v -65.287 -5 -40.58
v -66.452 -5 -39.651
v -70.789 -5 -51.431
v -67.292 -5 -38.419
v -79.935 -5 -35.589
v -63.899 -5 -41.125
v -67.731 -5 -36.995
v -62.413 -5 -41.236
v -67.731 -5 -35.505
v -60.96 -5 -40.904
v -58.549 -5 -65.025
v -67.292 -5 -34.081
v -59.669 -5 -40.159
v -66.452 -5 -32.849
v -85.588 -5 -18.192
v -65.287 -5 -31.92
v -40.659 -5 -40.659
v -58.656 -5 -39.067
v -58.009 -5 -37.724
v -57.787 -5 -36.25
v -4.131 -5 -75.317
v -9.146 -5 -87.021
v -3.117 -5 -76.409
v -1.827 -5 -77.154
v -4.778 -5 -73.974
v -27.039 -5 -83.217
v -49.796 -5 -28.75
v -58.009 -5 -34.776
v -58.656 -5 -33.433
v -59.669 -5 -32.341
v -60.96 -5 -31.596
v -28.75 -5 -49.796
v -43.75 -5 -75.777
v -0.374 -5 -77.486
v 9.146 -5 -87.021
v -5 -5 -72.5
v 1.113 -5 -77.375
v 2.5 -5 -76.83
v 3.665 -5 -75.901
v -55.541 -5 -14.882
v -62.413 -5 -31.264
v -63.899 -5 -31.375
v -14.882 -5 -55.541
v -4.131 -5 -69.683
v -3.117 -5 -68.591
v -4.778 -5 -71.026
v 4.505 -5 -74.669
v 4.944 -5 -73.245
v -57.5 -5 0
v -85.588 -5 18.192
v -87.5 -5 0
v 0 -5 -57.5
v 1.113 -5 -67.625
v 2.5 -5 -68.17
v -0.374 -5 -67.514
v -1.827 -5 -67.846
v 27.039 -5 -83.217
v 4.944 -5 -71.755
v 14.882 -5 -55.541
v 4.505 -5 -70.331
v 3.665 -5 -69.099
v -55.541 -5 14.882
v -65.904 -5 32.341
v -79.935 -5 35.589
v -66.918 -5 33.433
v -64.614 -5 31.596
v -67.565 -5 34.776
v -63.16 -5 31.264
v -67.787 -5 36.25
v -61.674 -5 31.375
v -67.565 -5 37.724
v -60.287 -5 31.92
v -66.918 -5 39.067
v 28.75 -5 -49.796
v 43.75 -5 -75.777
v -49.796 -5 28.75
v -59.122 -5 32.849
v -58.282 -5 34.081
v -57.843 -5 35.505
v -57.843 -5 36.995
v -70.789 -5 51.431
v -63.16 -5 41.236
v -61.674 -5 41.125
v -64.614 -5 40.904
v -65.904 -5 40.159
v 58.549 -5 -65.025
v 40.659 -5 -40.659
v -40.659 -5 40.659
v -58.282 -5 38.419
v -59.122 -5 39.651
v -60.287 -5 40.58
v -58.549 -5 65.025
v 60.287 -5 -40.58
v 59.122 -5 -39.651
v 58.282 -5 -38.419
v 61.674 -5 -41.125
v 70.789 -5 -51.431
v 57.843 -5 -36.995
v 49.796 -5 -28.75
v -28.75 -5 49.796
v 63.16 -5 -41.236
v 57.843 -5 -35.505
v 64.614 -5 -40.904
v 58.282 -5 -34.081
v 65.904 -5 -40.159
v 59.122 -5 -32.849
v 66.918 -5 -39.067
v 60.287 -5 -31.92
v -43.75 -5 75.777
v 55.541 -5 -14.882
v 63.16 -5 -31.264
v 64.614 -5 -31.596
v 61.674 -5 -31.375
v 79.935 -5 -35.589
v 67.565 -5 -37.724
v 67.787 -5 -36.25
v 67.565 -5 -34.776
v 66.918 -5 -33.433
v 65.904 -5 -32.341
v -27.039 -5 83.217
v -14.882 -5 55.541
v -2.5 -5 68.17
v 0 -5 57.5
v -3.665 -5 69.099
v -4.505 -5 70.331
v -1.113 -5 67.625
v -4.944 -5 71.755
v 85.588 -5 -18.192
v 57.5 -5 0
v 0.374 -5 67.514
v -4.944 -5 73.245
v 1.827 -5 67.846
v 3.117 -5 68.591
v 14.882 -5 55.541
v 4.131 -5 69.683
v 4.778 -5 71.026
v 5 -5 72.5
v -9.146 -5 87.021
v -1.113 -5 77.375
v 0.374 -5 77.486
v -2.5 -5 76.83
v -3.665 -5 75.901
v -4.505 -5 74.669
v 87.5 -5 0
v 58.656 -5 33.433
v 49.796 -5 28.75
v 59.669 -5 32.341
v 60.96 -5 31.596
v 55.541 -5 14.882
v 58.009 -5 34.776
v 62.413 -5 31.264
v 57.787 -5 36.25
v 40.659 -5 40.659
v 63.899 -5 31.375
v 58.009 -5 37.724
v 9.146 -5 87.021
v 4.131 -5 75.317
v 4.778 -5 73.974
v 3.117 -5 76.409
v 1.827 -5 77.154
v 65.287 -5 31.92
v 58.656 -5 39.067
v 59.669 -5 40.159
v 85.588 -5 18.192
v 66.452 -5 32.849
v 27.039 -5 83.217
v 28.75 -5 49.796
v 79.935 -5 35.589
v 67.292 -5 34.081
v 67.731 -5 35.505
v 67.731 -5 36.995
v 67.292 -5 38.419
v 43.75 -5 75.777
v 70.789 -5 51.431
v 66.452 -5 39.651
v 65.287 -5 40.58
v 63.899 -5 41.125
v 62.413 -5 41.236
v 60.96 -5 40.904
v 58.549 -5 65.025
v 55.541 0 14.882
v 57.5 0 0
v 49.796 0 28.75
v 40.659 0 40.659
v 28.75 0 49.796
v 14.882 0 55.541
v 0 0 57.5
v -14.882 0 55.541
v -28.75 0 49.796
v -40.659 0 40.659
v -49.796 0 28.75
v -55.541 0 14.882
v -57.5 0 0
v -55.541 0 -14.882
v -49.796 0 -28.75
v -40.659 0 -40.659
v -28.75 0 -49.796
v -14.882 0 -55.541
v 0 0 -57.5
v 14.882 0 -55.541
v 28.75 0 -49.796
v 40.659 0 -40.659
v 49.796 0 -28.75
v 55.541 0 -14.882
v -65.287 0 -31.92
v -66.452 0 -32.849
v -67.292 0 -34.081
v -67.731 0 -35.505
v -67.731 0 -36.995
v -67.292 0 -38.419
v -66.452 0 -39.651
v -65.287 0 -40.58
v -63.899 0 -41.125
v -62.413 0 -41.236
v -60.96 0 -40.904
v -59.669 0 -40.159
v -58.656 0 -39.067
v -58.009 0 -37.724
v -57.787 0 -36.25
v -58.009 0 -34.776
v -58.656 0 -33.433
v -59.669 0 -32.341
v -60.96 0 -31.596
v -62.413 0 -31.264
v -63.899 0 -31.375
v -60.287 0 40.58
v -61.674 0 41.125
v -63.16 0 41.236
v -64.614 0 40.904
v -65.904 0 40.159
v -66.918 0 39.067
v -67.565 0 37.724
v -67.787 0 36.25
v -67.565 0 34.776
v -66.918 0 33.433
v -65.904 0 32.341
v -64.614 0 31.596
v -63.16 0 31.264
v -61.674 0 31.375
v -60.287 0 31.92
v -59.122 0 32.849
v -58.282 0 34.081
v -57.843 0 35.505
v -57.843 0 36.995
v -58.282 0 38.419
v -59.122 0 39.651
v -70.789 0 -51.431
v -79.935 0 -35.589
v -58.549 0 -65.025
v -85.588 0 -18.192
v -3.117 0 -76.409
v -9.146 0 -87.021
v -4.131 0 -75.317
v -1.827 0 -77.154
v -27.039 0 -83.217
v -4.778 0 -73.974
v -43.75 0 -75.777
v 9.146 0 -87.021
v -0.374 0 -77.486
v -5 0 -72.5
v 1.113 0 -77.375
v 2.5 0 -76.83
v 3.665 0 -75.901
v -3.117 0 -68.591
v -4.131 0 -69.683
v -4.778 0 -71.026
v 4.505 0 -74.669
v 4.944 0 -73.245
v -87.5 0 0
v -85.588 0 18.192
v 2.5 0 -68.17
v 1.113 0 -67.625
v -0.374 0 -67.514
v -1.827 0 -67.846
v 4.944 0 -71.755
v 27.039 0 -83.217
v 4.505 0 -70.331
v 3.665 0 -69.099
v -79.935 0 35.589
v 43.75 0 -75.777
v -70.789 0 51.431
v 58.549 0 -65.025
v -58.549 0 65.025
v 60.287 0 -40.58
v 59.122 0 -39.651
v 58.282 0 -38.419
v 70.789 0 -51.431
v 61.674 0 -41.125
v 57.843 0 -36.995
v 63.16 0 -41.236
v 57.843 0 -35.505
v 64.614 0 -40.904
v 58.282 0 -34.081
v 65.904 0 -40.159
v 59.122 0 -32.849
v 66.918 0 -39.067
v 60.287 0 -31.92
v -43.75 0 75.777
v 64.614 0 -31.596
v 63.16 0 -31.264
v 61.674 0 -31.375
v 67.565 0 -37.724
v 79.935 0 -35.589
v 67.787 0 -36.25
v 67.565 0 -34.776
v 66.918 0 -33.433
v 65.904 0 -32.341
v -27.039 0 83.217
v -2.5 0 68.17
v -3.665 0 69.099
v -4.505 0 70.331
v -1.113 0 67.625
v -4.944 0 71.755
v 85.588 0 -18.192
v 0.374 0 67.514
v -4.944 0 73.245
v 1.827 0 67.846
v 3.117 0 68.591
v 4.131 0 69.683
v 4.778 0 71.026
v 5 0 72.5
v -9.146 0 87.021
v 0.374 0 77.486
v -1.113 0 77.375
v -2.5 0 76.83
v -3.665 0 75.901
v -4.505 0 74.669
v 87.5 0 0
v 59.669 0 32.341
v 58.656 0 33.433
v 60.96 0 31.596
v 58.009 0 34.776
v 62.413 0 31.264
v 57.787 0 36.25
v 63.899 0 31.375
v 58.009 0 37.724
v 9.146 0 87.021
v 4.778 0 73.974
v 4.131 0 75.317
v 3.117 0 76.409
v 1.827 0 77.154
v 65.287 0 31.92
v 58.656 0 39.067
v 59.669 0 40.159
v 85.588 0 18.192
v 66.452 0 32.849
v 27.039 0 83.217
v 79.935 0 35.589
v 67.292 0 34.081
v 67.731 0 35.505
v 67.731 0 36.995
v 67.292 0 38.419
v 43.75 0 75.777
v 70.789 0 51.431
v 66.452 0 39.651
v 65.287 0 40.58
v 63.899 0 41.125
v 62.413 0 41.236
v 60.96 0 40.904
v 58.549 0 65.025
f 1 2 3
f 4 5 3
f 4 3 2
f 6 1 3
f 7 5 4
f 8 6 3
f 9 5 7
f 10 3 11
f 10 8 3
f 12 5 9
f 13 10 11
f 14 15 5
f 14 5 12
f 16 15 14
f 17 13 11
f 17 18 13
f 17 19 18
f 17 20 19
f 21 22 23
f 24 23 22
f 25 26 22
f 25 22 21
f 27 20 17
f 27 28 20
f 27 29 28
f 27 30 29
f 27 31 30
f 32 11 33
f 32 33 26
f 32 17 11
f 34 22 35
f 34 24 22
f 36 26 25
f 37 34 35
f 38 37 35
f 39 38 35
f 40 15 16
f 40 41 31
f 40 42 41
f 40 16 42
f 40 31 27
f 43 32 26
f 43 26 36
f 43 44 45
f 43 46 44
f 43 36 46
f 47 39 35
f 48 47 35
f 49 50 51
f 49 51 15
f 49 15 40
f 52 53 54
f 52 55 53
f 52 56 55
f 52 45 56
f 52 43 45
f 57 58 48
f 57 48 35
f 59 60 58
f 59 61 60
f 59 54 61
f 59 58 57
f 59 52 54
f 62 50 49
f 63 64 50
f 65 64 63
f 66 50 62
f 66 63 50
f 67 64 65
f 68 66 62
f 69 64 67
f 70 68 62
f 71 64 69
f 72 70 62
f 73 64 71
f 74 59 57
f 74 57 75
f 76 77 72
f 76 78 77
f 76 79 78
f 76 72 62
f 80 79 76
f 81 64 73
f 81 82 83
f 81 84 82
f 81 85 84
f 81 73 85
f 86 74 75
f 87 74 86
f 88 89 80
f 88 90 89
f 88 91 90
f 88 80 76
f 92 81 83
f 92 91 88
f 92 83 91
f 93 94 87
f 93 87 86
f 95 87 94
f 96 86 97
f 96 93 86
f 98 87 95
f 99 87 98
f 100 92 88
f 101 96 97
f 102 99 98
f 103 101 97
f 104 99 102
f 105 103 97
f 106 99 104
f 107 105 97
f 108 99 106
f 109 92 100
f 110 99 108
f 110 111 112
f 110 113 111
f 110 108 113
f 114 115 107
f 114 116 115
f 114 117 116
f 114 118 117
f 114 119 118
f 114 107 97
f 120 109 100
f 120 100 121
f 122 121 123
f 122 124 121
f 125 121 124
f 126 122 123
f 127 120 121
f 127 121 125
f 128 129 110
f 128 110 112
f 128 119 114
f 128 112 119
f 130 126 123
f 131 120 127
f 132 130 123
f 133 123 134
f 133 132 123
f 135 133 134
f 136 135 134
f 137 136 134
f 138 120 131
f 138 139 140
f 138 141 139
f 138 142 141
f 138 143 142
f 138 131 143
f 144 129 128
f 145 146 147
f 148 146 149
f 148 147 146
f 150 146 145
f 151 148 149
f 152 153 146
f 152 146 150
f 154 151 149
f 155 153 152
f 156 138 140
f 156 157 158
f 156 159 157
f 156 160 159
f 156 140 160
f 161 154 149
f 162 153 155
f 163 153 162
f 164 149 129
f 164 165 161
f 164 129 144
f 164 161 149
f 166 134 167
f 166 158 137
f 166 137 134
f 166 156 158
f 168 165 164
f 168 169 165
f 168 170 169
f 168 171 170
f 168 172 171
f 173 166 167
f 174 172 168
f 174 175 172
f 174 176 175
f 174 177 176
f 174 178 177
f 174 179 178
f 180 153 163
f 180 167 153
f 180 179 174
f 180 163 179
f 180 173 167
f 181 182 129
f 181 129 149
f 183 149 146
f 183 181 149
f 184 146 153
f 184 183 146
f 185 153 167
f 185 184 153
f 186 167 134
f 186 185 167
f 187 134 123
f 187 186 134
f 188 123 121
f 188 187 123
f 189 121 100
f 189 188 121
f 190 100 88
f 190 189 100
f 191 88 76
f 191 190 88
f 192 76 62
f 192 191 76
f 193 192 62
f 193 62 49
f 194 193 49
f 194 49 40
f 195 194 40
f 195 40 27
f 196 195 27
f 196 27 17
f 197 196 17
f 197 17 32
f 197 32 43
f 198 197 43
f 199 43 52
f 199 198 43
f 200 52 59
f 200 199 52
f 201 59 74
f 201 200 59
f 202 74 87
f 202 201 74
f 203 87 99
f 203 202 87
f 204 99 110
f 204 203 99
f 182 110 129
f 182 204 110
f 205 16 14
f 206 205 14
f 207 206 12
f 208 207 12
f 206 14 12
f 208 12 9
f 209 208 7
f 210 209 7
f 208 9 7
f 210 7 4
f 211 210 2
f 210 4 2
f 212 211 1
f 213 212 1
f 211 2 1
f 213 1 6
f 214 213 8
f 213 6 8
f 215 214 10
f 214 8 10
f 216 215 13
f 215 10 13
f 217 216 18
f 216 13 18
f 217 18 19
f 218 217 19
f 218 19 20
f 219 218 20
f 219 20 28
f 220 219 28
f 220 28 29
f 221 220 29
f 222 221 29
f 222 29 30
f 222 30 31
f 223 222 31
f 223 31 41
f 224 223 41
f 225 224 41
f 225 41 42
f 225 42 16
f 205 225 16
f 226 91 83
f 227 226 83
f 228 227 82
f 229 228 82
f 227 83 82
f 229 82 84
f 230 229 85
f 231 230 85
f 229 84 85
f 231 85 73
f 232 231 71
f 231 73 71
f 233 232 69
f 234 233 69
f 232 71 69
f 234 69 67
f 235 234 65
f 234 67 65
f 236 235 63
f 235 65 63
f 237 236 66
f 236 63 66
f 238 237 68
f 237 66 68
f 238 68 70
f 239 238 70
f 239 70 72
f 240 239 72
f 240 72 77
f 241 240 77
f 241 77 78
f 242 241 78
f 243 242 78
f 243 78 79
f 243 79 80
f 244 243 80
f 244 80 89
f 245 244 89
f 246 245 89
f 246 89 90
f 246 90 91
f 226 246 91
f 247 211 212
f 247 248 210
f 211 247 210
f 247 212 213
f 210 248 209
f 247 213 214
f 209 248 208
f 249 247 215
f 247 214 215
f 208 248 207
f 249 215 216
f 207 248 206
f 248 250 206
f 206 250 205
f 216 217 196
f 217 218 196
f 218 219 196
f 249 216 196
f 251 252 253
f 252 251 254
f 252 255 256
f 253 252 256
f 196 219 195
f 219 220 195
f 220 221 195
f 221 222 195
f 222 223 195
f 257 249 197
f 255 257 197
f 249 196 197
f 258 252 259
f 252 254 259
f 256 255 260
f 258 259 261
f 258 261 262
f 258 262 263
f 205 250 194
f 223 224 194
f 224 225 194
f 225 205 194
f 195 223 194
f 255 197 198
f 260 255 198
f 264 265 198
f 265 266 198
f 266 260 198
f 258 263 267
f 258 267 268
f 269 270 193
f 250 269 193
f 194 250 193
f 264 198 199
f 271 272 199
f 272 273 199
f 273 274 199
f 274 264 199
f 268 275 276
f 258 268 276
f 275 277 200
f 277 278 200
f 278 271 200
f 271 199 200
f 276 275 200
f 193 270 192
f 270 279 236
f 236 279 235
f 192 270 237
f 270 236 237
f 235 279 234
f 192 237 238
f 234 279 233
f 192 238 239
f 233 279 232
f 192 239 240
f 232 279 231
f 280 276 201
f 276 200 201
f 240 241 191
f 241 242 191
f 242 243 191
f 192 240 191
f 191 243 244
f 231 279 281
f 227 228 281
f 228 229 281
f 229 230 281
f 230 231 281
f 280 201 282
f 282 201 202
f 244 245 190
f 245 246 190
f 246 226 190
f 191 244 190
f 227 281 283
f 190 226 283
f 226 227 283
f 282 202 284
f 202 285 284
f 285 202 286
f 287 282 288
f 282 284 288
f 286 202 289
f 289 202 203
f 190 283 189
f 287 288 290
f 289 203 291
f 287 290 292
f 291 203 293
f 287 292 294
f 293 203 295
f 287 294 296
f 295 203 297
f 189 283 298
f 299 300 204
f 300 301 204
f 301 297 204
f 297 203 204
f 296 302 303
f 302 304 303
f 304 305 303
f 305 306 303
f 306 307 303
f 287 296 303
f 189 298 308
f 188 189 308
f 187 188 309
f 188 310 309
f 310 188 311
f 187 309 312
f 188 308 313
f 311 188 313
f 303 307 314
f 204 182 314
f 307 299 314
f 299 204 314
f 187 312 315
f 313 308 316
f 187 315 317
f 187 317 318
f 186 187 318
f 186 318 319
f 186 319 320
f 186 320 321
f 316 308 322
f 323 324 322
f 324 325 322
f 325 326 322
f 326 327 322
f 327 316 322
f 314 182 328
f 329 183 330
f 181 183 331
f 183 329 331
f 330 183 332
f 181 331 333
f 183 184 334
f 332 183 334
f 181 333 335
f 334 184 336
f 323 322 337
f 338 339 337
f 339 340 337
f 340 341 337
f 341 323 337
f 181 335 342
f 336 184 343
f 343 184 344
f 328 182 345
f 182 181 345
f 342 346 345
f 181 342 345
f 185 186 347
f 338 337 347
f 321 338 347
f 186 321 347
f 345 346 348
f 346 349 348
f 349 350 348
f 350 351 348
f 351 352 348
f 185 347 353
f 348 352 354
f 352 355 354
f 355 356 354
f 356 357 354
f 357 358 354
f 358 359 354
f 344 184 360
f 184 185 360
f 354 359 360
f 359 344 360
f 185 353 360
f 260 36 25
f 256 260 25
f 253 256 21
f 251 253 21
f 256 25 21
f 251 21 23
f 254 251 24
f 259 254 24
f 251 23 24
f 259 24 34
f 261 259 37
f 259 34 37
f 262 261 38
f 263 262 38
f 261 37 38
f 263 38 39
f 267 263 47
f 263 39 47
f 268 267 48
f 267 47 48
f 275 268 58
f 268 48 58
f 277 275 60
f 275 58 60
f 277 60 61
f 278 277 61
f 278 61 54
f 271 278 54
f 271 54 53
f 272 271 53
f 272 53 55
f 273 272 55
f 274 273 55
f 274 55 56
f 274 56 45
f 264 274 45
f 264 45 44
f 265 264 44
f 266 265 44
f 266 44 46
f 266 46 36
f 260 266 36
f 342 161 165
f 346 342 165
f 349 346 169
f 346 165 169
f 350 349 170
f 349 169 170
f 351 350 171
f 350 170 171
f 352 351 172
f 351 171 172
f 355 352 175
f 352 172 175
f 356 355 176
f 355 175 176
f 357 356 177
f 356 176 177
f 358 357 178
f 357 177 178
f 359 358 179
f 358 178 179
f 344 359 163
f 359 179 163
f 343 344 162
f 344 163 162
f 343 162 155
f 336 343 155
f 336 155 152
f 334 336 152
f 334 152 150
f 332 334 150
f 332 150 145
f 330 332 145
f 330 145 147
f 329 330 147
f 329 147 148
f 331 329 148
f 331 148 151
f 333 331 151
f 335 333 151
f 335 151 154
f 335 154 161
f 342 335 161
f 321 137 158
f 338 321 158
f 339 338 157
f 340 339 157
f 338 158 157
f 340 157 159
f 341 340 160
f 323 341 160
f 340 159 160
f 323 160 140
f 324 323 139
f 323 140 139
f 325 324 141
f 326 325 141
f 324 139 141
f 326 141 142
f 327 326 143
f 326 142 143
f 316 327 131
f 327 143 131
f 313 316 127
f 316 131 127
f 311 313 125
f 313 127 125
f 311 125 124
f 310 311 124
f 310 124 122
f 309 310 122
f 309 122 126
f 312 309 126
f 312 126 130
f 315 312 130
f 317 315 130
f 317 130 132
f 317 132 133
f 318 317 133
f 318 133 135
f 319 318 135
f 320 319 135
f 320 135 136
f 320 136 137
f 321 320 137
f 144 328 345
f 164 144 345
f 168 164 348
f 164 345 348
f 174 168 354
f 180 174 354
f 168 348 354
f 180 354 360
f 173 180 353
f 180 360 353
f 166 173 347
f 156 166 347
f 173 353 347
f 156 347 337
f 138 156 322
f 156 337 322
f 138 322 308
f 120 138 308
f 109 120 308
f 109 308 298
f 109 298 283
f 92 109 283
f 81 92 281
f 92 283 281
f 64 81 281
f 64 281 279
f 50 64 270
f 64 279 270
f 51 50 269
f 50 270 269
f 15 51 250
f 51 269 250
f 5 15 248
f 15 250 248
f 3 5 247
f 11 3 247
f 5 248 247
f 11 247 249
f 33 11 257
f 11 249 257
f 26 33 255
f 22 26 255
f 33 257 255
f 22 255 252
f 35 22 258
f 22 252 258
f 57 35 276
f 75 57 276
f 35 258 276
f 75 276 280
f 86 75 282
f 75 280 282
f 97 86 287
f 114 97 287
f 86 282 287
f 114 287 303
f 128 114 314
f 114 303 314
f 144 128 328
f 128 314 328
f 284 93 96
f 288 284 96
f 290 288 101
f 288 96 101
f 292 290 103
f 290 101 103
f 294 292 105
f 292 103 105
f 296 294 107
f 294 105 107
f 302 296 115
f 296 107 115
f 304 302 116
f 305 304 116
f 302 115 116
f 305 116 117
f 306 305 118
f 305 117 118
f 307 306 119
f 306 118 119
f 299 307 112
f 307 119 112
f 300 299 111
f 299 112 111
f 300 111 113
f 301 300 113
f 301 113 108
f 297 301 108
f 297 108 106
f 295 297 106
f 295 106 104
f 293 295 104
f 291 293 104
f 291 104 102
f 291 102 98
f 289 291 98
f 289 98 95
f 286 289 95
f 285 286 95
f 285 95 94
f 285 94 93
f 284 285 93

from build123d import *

# Parameters (mm, degrees)
F0_R            = 87.5
F0_R_2          = 57.5
F1_DEPTH        = 5
F2_R            = 5
F3_DEPTH        = 5.001
F3_COPIES_COUNT = 6


# Not quite as in the source:
# - a pattern or mirror of a feature is missing from the dataset's text; its kind, count and spacing are read off the source's solid


with BuildPart() as f1:
    # F0 (on Front) → F1 (new body)
    with BuildSketch(Plane.XZ):
        Circle(F0_R)
        Circle(F0_R_2, mode=Mode.SUBTRACT)
    extrude(amount=F1_DEPTH)

    # F2 (on face) → F3 (cut, through all)
    with BuildSketch(Plane.XZ.offset(5)):
        with Locations((0, 72.5)):
            Circle(F2_R)
    f3 = extrude(amount=-F3_DEPTH, mode=Mode.SUBTRACT)

    # F3_copies: F3 ×6 about axis
    f3_copies_axis = Axis((0, 0, 0), (0, 1, 0))
    for i in range(1, F3_COPIES_COUNT):
        add(f3.rotate(f3_copies_axis, i * 360 / F3_COPIES_COUNT), mode=Mode.SUBTRACT)


solid = f1.part
